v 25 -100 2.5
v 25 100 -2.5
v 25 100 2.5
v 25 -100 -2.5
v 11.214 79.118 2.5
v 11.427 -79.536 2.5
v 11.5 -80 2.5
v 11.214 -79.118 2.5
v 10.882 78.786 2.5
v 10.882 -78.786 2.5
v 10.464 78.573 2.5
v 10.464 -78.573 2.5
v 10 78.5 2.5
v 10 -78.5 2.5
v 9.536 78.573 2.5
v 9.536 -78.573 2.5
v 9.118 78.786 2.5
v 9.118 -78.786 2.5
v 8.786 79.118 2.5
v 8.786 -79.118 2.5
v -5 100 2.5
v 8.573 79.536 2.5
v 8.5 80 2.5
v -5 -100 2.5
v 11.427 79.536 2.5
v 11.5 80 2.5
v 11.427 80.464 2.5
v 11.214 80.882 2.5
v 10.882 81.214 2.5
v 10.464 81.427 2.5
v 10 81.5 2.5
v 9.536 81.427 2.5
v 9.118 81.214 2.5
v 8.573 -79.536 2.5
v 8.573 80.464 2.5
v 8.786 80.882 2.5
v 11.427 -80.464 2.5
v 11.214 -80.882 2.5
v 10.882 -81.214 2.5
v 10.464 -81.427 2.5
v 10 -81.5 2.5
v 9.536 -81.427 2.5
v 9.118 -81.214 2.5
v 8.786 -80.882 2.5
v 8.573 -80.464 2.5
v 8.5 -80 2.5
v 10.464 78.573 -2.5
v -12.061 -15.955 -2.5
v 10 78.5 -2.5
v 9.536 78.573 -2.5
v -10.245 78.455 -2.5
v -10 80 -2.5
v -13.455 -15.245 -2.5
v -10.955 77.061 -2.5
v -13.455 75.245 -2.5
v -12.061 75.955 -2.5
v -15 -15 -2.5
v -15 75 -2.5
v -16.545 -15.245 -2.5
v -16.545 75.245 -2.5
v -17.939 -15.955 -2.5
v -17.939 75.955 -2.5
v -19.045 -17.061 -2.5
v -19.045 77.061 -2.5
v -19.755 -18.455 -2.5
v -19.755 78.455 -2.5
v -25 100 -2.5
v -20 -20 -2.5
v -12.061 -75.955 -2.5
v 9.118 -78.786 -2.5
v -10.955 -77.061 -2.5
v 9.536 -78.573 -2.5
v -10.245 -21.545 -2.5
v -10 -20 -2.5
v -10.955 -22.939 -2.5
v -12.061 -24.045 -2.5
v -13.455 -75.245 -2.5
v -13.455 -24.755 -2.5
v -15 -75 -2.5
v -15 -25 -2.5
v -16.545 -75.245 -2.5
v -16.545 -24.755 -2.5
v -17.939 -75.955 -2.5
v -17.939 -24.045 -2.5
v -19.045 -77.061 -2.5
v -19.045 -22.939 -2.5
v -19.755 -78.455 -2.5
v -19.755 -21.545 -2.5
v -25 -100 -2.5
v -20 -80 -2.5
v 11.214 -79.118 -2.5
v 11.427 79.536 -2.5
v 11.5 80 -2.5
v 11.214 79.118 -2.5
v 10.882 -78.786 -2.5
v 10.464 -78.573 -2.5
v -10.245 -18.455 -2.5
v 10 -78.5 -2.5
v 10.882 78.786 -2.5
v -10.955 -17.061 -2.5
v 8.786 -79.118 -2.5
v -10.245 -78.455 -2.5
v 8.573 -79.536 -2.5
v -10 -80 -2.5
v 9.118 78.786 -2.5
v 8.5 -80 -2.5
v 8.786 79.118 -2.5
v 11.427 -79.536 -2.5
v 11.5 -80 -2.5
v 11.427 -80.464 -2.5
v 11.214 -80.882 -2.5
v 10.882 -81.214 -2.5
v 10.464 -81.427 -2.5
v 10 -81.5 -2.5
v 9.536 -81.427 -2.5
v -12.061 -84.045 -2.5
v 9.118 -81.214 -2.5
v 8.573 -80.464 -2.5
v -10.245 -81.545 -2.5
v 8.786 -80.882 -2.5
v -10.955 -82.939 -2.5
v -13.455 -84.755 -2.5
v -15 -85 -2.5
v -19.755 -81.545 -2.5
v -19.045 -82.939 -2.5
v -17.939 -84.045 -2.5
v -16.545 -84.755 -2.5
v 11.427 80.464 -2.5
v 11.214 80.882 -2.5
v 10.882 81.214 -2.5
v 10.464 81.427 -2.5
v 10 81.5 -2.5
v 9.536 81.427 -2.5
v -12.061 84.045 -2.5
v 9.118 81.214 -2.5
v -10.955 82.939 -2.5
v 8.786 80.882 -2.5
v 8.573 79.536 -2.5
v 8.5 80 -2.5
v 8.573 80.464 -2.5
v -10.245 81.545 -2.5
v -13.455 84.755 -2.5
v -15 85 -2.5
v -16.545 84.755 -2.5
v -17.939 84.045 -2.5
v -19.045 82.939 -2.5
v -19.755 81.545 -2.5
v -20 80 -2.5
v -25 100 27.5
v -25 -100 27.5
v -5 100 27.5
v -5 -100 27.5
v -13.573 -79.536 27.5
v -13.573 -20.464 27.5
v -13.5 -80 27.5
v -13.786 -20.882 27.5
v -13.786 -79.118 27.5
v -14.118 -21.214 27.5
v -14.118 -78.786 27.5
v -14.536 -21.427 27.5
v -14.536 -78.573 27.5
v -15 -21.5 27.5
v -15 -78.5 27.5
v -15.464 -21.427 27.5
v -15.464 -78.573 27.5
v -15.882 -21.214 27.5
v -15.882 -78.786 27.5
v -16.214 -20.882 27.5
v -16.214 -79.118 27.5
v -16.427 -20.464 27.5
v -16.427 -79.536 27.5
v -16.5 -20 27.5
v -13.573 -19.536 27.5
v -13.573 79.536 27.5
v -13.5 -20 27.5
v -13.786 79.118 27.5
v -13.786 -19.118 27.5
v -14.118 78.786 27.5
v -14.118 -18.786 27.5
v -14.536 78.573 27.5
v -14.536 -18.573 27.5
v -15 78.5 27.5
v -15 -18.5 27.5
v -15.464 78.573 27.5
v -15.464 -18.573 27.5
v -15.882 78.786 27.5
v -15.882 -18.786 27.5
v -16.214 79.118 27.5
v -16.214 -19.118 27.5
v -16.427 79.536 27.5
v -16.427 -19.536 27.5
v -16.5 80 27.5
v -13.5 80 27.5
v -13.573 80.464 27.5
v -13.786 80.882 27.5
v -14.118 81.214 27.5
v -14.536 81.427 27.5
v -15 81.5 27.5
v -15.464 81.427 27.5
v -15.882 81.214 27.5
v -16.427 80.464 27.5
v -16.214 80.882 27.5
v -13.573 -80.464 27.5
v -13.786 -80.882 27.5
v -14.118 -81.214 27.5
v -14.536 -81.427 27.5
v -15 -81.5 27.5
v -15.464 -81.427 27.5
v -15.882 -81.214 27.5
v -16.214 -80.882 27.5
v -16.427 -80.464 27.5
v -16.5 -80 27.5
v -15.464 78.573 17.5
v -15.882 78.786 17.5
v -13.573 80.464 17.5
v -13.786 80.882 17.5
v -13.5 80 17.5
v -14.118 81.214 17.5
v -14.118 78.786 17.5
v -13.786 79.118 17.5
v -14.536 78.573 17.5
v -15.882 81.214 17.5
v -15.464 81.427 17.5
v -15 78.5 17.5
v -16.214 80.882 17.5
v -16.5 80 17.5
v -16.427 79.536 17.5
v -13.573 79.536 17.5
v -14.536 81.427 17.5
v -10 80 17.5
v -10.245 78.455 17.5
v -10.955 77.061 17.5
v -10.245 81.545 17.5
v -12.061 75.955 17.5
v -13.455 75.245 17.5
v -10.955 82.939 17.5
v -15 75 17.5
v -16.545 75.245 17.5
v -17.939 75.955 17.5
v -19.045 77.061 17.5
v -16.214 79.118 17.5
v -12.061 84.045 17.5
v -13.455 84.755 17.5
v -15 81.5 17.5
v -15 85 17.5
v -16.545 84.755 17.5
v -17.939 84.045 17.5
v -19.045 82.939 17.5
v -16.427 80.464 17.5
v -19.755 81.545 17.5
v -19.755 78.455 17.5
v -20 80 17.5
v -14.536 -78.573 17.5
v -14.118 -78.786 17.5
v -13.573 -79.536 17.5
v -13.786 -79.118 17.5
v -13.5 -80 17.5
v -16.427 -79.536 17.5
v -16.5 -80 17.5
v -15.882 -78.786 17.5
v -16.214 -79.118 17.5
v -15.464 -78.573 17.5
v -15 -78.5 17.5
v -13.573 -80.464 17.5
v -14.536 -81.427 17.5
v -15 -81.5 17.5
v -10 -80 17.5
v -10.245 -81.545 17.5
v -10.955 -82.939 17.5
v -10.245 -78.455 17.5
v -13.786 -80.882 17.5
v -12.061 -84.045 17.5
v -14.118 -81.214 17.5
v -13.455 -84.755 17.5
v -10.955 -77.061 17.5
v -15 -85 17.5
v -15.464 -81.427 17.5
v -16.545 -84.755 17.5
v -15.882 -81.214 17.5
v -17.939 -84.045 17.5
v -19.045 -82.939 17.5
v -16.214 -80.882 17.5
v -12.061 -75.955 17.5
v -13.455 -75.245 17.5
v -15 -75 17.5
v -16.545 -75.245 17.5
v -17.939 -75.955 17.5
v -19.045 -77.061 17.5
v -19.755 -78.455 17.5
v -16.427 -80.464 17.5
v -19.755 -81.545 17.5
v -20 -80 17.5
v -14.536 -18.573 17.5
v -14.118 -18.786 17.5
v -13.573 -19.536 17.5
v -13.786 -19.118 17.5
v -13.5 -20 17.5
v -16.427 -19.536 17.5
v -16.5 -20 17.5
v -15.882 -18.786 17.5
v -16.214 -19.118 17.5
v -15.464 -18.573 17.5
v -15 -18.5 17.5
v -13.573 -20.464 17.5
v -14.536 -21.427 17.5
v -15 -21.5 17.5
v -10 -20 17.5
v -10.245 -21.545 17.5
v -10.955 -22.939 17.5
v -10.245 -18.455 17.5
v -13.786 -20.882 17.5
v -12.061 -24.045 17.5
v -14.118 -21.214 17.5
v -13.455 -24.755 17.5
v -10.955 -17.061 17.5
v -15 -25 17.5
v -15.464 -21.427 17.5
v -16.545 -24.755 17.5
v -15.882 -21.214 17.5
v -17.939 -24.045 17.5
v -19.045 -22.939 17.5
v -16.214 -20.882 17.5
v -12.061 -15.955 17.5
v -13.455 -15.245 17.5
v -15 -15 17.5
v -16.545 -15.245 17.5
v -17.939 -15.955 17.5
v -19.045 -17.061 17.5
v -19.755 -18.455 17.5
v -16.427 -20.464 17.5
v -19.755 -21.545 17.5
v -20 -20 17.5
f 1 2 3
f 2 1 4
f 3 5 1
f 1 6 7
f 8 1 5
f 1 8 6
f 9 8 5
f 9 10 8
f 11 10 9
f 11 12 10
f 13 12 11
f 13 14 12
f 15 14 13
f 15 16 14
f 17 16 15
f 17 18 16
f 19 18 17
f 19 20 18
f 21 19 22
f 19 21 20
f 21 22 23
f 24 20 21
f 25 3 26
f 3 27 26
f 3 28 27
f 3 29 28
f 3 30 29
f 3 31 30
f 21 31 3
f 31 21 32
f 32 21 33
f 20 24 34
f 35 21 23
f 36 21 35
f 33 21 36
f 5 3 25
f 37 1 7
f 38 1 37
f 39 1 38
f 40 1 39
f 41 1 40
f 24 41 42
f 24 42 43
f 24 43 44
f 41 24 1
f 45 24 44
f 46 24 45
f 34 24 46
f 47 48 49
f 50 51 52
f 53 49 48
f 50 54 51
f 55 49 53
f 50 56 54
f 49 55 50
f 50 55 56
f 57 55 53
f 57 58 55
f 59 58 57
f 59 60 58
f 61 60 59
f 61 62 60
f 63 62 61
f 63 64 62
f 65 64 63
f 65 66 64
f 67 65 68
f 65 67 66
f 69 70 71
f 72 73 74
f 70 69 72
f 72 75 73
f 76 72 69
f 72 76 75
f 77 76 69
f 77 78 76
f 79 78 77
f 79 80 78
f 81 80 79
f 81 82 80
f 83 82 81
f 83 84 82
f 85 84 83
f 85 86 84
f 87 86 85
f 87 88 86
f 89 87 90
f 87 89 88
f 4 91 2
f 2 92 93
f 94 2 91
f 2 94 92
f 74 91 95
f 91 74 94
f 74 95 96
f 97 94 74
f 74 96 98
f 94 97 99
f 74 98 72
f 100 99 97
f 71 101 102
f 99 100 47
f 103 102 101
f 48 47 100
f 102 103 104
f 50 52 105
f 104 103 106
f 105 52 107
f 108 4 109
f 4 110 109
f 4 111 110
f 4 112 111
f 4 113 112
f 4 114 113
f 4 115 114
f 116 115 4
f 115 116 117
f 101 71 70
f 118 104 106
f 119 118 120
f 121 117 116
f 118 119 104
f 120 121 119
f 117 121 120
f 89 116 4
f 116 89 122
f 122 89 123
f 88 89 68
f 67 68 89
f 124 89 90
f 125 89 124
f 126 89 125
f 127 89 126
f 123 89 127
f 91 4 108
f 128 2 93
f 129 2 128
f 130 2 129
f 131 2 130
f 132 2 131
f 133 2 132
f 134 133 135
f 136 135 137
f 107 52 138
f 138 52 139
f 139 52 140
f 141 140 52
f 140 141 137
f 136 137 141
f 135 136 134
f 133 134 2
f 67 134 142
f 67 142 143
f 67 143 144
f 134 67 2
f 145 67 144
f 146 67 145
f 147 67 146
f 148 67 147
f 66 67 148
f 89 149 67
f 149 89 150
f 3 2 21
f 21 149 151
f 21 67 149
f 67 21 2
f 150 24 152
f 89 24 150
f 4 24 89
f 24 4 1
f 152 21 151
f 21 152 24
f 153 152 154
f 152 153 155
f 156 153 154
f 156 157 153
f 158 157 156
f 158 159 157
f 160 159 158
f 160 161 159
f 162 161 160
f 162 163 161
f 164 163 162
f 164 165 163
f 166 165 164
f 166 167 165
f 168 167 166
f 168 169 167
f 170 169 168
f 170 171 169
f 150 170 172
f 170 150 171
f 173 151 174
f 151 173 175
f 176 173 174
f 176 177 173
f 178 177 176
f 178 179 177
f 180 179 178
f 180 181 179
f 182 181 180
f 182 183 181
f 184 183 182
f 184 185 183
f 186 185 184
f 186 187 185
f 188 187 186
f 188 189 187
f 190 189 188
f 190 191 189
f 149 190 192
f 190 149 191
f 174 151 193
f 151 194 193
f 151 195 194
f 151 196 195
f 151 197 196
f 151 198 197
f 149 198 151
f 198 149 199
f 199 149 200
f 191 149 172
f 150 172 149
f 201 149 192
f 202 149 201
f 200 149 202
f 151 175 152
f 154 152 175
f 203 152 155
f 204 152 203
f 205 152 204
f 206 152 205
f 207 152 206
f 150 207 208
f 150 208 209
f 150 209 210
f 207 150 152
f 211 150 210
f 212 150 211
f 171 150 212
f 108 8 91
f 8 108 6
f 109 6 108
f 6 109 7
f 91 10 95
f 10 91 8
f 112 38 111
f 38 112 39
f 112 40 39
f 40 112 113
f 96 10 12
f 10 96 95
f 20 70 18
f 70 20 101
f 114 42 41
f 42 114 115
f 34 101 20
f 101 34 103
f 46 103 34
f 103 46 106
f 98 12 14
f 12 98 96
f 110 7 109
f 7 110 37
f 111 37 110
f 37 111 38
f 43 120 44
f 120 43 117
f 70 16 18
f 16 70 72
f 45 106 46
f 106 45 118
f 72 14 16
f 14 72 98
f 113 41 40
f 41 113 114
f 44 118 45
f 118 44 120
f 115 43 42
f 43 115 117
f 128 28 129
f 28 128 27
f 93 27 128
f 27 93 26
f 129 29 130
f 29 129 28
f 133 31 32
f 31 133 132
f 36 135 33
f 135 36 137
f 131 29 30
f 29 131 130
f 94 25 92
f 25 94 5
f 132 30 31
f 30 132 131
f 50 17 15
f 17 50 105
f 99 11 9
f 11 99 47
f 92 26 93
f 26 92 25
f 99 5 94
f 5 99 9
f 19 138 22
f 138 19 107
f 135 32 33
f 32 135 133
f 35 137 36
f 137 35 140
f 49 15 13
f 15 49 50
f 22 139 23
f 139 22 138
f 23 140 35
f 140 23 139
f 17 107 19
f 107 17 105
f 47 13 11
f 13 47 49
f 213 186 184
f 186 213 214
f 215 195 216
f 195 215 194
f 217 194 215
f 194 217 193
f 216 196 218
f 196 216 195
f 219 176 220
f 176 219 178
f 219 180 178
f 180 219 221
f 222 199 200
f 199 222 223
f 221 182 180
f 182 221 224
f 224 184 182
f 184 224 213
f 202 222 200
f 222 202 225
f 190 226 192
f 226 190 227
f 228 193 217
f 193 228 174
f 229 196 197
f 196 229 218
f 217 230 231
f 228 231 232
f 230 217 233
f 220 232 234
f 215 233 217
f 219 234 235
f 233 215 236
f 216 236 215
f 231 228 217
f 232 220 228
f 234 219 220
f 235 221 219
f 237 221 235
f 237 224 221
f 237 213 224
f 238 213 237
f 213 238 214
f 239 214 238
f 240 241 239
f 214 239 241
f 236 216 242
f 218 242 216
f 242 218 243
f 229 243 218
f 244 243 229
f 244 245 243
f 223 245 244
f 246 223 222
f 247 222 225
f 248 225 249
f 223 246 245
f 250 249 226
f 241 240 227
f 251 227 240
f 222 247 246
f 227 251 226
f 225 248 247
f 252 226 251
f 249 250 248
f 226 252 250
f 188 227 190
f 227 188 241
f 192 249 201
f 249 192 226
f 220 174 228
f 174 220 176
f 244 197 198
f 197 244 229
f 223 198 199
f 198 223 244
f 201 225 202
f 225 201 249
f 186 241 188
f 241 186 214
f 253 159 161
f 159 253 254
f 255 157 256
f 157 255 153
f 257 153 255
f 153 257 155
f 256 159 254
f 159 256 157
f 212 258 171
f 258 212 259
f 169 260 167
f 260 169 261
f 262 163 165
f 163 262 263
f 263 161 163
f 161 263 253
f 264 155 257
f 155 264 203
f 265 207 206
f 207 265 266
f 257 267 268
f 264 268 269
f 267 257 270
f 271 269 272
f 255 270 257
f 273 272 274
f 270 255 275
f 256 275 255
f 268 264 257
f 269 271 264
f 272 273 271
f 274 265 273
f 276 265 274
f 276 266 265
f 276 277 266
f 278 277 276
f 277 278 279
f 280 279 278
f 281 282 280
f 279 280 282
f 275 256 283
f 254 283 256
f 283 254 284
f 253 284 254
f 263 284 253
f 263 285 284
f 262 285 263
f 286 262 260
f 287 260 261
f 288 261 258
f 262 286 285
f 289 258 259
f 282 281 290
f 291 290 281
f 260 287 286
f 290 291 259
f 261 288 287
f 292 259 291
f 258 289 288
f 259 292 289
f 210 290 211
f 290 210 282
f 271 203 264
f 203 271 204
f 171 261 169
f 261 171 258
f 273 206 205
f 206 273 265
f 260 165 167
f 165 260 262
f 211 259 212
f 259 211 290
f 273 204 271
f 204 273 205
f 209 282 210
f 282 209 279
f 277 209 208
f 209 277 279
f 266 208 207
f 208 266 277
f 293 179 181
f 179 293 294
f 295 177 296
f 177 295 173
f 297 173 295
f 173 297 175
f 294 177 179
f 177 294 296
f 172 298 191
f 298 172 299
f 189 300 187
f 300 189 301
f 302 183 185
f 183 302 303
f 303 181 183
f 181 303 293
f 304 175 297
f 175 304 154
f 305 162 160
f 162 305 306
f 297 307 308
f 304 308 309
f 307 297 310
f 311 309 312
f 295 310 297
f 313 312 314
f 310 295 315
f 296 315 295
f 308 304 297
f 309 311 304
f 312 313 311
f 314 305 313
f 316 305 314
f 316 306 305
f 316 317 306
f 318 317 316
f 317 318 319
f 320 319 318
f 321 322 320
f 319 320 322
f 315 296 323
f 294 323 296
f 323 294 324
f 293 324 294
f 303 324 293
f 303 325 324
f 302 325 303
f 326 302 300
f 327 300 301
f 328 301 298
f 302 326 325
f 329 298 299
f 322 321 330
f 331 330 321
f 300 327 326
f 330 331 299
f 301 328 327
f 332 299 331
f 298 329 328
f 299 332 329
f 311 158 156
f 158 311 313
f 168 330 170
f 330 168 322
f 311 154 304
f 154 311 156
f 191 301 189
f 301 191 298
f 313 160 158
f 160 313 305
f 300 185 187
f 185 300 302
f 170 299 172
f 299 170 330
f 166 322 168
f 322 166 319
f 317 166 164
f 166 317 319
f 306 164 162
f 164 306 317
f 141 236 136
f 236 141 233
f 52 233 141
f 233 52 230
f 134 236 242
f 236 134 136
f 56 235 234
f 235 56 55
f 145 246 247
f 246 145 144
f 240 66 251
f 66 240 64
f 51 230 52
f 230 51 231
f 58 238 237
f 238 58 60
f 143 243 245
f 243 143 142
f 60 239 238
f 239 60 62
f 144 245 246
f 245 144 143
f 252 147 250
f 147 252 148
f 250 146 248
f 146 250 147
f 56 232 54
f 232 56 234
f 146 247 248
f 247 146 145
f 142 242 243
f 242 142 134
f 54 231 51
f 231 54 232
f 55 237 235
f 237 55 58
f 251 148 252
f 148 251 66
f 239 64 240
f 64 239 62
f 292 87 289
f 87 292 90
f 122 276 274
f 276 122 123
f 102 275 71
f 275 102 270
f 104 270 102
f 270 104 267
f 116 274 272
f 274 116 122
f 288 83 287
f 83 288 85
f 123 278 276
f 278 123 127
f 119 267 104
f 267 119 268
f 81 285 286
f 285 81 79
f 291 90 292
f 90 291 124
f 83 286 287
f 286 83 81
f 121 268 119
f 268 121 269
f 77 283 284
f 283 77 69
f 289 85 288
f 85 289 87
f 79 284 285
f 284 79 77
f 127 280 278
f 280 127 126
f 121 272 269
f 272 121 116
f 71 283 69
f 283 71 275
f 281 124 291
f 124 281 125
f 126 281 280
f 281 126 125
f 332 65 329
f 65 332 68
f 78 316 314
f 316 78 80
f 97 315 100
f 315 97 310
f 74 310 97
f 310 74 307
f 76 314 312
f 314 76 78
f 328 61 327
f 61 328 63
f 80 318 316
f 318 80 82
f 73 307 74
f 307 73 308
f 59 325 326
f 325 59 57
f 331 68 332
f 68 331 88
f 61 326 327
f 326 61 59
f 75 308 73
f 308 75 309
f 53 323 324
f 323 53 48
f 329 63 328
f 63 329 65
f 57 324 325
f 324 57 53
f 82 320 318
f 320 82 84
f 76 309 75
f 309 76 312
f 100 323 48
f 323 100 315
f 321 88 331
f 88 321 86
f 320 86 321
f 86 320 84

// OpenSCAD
//Author: Piotr Paterek, Kraków 05-08.2016
$fn=20;
module bevel(){
cube([50, 200, 5], center=true);
translate([-15, 0, 15])
{
    cube([20, 200, 25], center=true);
    
}
}
module bevelholes()
{
difference()
{
    difference()
    {
        difference()
            {
            difference()
                {
                difference(){
                    difference()
                    {  
                        bevel();
                        translate([10, -80, -2.5])
                        {
                            cylinder(r=1.5, h=5);
                        }
                    }
                    translate([10, 80, -2.5])
                        {
                        cylinder(r=1.5, h=5);
                        }
                    }
                translate([-15, 80, 17.5])
                    {
                    cylinder(r=1.5, h=10);
                    }
                 }
            translate([-15, -80, 17.5])
                {
                cylinder(r=1.5, h=10);
                }
            }
            translate([-15, -20, 17.5])
                {
                cylinder(r=1.5, h=10);
                }
            }
        }
    }
    
 
difference()
{ 
     difference()
        {   
            difference()
            {
                bevelholes();
                translate([-15,80,-2.5])
                {
                    cylinder(r=5, h=20);
                }
            }
            translate([-15,-80,-2.5])
                {
                    cylinder(r=5, h=20);
                }
            }
            
         translate([-15,-20,-2.5])
                {
                    cylinder(r=5, h=20);
                }
            }
